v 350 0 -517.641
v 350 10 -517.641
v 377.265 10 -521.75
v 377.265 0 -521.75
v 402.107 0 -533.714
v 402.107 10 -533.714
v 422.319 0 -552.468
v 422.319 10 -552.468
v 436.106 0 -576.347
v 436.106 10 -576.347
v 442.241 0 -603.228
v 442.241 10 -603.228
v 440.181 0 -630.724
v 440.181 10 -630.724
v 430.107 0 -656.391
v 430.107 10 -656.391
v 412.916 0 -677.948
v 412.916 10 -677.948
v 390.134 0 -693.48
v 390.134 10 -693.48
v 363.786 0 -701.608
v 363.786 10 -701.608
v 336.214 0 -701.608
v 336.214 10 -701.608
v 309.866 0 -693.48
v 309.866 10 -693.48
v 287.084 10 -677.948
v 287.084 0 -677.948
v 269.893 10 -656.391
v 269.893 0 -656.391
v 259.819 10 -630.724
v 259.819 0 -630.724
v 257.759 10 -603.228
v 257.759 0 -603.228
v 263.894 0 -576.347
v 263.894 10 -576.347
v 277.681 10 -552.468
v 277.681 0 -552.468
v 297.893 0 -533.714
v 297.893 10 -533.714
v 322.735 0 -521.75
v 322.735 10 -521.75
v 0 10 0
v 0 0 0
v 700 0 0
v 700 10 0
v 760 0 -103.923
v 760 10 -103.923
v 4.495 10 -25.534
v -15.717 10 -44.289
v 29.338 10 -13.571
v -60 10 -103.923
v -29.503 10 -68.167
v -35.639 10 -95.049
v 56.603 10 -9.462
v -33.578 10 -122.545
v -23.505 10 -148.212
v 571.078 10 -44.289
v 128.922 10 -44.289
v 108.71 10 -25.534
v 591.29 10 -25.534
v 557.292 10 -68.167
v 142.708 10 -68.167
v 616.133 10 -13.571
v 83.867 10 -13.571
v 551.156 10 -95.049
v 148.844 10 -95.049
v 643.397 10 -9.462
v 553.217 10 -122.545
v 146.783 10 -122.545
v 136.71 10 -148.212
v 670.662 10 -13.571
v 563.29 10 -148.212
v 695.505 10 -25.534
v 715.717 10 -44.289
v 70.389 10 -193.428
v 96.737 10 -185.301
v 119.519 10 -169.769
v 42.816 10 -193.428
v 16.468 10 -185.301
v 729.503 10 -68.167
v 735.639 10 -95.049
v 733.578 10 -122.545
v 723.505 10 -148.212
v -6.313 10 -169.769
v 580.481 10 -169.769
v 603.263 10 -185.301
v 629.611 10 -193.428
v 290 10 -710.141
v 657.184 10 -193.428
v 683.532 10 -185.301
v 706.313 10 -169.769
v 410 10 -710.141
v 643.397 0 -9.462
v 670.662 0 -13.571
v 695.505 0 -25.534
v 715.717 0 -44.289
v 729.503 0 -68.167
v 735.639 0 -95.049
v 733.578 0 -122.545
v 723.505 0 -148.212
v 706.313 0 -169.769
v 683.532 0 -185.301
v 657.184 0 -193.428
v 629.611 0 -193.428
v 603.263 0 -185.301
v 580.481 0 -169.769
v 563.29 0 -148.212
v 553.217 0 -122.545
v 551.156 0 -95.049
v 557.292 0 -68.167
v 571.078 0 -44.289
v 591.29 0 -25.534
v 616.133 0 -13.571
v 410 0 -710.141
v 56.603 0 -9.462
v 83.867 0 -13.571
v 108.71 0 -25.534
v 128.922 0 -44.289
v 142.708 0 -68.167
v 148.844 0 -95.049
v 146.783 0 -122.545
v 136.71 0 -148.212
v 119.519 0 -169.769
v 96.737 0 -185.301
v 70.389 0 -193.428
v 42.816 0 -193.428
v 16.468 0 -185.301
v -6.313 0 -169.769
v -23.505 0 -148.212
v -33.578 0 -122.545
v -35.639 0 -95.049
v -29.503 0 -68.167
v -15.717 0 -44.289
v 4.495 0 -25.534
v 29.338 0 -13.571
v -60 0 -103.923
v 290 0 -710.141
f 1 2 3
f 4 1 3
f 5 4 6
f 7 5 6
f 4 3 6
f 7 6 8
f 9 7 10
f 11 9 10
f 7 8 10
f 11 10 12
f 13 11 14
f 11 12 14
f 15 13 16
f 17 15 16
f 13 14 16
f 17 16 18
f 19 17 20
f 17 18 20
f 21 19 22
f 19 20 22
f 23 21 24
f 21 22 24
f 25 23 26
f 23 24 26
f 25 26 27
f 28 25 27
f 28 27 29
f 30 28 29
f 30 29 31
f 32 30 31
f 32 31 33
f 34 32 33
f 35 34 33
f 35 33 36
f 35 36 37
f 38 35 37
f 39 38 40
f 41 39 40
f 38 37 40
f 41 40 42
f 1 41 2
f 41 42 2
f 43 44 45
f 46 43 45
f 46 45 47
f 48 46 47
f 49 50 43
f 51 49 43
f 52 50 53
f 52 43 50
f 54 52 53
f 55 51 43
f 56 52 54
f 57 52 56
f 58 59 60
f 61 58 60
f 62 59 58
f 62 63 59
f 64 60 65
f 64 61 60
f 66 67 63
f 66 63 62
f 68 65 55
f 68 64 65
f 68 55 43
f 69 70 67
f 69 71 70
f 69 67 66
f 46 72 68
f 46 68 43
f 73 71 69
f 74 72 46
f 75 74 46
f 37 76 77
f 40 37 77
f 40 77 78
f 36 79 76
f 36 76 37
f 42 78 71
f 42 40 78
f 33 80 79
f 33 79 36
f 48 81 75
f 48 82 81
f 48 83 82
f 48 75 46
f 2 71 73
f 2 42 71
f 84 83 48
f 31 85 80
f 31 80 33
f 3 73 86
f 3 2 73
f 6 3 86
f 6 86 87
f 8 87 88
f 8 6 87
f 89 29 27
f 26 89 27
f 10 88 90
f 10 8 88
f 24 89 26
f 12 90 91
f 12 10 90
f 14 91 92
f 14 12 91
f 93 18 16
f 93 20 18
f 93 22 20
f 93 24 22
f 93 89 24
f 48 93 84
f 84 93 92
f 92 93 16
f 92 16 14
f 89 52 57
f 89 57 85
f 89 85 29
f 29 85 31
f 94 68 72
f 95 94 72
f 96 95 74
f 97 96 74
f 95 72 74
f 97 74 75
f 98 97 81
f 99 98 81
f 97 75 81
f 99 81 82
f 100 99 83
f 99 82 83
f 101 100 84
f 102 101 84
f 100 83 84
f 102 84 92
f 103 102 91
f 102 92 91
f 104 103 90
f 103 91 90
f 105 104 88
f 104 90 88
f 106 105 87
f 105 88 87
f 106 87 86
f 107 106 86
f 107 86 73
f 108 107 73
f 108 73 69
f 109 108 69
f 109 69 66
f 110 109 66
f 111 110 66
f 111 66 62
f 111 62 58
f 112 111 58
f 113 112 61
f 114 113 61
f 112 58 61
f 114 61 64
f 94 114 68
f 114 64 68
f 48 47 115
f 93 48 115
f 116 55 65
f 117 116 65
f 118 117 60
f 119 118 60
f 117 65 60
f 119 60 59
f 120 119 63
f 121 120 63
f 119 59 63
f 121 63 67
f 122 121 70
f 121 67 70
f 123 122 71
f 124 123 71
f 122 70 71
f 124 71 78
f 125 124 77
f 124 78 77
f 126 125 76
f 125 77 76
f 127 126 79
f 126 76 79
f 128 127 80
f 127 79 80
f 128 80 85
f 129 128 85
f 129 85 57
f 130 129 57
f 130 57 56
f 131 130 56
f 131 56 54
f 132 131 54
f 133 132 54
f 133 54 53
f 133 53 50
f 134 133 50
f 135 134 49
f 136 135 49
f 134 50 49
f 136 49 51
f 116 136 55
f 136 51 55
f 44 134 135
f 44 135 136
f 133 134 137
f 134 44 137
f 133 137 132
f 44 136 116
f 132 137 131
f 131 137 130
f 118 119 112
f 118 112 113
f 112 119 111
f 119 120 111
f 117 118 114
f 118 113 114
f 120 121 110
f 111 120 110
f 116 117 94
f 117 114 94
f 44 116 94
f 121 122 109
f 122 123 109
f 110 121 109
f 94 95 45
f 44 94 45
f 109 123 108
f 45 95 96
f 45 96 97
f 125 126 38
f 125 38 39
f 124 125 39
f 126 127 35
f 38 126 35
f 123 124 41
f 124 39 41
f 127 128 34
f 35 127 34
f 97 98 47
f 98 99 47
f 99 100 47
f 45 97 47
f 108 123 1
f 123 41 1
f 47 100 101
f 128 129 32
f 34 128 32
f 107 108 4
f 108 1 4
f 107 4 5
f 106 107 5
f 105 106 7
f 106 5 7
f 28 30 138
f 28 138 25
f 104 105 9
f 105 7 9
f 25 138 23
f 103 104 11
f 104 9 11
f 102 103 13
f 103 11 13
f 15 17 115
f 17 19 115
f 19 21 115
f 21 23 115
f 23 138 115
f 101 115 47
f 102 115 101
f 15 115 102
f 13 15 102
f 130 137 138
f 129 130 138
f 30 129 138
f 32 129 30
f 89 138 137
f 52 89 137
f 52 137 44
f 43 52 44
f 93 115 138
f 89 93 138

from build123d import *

# Parameters (mm, degrees)
EXTRUDE_1_DEPTH     = 10
SKETCH_2_R          = 92.5
CUT_EXTRUDE_1_DEPTH = 10


with BuildPart() as part:
    # 草图1 → 凸台-拉伸1 (new body)
    with BuildSketch(Plane(origin=(0, 0, 0), x_dir=(1, 0, 0), z_dir=(0, 1, 0))):
        Polygon((0, 0), (700, 0), (760, 103.923048454), (410, 710.140831103), (290, 710.140831103), (-60, 103.923048454), align=None)
    extrude(amount=EXTRUDE_1_DEPTH)

    # 草图2 → 切除-拉伸1 (cut)
    with BuildSketch(Plane(origin=(0, 10, 0), x_dir=(1, 0, 0), z_dir=(0, 1, 0))):
        with Locations(Location((56.602540378, 101.961524227, 0), (0, 0, 270))):
            Circle(SKETCH_2_R)
        with Locations(Location((643.397459622, 101.961524227, 0), (0, 0, 270))):
            Circle(SKETCH_2_R)
        with Locations(Location((350, 610.140831103, 0), (0, 0, 270))):
            Circle(SKETCH_2_R)
    extrude(amount=-CUT_EXTRUDE_1_DEPTH, mode=Mode.SUBTRACT)


solid = part.part
